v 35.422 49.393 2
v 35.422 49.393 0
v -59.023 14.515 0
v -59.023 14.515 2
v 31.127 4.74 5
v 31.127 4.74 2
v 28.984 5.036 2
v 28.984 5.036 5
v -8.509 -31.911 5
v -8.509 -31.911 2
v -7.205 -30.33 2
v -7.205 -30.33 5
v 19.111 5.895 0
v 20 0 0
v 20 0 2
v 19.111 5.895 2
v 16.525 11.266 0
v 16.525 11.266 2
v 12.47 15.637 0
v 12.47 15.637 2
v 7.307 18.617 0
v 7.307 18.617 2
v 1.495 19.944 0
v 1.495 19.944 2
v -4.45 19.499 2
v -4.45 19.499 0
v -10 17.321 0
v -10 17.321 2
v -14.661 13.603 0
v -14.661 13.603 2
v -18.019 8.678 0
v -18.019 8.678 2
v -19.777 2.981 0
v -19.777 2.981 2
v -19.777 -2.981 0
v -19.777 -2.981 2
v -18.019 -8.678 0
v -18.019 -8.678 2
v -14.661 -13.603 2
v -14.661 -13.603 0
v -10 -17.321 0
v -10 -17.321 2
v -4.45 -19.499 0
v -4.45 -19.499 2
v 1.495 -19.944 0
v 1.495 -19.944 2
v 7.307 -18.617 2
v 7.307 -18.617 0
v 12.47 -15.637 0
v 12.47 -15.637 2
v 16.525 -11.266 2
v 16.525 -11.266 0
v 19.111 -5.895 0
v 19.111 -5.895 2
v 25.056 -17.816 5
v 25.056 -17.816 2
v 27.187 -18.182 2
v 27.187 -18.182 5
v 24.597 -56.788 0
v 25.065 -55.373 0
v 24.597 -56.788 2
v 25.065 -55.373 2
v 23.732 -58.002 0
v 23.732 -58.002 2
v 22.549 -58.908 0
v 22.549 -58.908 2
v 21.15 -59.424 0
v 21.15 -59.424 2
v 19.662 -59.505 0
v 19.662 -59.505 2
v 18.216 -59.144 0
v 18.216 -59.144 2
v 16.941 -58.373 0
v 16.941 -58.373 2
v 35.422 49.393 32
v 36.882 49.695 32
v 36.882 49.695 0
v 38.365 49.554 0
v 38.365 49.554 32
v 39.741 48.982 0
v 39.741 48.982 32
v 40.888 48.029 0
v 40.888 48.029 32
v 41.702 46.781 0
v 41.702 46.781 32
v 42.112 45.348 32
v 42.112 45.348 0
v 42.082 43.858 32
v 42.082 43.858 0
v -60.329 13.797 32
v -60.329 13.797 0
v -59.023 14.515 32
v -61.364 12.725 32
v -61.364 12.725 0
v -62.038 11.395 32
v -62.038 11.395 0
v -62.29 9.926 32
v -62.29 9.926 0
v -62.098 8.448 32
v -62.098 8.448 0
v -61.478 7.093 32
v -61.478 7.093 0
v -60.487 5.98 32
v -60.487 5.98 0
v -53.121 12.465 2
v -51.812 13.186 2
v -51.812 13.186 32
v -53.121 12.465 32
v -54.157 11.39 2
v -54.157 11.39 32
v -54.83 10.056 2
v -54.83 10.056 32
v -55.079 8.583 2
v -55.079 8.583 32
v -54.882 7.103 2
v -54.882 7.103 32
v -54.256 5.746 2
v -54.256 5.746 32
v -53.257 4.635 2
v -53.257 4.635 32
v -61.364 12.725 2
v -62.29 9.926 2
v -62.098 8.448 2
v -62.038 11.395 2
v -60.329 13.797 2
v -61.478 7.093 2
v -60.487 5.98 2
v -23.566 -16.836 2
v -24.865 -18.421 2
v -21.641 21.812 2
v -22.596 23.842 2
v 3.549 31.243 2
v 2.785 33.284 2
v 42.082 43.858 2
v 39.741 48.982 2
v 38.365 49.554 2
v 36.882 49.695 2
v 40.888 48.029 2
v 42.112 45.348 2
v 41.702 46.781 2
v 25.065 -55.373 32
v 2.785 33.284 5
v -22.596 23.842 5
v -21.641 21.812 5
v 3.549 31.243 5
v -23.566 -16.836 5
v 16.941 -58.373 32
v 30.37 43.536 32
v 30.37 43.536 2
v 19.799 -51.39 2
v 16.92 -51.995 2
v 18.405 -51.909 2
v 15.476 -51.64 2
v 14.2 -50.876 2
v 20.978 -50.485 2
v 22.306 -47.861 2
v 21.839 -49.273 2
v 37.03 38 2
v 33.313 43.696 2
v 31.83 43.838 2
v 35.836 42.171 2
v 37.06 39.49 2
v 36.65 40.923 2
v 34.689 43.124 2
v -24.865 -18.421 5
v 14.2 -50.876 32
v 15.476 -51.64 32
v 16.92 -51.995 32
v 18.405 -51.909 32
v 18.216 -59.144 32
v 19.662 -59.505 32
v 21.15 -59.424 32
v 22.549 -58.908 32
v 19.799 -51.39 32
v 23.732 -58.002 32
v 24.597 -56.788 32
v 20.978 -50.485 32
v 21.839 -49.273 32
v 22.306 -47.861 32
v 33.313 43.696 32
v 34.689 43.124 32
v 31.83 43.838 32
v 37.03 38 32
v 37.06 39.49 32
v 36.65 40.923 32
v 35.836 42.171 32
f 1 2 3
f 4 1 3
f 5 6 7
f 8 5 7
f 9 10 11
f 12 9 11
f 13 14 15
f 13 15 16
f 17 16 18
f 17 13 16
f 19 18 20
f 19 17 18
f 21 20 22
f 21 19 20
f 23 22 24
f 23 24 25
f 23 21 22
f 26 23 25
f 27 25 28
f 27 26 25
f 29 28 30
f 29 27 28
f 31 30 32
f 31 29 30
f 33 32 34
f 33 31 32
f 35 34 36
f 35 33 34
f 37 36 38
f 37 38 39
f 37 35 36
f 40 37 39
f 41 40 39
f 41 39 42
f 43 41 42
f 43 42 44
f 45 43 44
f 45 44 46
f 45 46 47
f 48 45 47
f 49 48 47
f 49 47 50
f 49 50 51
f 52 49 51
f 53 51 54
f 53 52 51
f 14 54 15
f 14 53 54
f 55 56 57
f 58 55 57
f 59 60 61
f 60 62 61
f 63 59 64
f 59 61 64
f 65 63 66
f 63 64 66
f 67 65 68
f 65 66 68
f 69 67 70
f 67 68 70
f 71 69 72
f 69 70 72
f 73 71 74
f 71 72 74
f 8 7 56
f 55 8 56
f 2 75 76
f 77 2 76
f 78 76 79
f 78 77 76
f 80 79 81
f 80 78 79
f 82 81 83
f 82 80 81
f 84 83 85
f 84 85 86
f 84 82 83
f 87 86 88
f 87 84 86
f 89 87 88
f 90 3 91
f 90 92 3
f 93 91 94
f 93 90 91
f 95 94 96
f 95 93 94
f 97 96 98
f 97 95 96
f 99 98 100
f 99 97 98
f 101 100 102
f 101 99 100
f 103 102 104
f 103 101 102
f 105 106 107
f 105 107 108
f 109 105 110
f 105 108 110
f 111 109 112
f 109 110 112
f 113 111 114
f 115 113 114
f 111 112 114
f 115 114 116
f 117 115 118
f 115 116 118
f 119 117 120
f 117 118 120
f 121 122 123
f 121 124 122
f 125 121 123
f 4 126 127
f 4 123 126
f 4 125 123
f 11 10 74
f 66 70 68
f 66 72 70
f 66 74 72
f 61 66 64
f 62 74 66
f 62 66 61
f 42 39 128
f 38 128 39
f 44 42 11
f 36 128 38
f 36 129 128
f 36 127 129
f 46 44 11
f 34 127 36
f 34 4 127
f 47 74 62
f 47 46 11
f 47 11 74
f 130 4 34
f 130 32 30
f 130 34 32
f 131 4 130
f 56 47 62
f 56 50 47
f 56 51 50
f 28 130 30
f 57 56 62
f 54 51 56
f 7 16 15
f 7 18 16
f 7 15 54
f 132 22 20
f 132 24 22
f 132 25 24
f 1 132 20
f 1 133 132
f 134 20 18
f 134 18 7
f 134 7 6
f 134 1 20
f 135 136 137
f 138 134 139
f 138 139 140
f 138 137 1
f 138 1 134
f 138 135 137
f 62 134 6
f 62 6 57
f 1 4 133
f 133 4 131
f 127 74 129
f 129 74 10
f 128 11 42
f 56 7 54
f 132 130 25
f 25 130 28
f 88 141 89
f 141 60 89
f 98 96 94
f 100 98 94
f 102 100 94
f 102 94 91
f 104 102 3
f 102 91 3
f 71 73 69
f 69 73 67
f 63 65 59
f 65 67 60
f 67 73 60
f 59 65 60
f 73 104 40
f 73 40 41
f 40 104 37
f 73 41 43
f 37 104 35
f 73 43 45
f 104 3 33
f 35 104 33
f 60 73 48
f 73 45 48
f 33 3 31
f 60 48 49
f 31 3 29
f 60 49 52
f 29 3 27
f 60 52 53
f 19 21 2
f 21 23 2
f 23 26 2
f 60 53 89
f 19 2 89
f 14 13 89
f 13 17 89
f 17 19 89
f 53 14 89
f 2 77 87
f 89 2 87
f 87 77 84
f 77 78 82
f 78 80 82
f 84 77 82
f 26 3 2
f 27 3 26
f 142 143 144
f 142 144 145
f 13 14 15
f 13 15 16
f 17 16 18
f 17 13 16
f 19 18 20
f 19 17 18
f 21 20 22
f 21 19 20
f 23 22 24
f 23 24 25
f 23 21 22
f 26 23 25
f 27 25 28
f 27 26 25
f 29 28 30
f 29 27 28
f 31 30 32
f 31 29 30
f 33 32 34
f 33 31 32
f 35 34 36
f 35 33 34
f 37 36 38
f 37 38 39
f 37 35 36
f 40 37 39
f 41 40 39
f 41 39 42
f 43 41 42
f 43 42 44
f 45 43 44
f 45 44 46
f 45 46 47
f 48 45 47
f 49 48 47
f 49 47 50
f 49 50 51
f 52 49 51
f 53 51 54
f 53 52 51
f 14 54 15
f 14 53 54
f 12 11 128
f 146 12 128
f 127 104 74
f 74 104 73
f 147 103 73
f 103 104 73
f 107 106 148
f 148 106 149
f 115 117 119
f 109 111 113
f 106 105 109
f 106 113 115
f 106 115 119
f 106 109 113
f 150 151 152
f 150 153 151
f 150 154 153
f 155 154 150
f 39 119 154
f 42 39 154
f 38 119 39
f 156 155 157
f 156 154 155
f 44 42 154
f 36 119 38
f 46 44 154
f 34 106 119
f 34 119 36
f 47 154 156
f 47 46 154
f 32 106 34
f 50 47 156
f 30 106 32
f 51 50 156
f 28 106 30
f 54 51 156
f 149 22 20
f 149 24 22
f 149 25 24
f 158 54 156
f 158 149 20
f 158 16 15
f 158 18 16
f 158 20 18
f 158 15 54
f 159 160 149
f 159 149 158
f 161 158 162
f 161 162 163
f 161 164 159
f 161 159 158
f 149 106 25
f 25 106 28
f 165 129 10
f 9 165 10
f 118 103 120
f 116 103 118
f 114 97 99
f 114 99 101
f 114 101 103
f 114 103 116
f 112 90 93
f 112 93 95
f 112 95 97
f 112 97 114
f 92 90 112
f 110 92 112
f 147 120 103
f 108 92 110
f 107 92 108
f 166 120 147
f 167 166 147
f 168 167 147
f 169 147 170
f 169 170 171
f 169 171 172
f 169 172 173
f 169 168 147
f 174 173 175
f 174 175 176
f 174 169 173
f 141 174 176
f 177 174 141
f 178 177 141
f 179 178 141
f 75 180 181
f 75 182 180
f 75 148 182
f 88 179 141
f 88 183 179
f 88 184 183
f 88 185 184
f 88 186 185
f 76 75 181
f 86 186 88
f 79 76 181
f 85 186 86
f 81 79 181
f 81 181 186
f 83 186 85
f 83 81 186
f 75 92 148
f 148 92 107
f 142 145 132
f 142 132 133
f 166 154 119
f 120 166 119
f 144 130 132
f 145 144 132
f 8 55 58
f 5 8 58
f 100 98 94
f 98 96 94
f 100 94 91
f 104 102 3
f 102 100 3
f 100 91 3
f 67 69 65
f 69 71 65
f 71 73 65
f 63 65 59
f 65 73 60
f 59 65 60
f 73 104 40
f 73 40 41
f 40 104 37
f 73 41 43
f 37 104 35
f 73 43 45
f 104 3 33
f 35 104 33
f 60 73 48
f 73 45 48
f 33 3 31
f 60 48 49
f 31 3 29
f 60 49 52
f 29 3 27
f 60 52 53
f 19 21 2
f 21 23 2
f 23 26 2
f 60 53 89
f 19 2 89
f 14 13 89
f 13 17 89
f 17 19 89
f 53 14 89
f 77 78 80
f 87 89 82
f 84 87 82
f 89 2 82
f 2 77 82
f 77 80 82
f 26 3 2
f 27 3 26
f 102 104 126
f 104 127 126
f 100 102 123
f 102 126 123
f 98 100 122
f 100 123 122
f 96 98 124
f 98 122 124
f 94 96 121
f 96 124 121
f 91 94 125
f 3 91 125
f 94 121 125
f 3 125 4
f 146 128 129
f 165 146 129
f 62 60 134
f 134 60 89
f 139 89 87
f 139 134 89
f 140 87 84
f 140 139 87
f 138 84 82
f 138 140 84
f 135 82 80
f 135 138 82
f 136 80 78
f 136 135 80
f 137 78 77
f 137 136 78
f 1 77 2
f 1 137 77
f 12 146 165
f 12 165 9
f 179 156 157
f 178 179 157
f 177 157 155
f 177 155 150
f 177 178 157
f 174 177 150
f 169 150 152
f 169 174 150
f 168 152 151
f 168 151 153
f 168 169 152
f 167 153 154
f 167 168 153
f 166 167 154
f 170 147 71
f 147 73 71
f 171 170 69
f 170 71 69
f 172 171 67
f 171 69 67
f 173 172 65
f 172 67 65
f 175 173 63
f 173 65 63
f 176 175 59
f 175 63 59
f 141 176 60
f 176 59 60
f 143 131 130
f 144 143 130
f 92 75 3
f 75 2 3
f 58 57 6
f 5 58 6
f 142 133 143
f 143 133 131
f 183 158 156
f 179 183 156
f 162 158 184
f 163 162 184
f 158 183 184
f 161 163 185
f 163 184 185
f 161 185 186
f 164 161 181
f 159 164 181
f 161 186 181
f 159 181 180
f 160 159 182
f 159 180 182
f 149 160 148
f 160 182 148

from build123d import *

# Parameters (mm, degrees)
F0_R     = 20
F1_DEPTH = 2
F3_DEPTH = 30
F4_R     = 5
F5_R     = 5
F6_DEPTH = 2
F7_R     = 5
F9_DEPTH = 3


with BuildPart() as f1:
    # F0 (on Top) → F1 (new body)
    with BuildSketch(Plane.XY):
        Polygon((23.6009889939, -63.9087368976), (43.5460951802, 52.3934244719), (-67.147084174, 11.5153124257), align=None)
        Circle(F0_R, mode=Mode.SUBTRACT)
    extrude(amount=F1_DEPTH)

    # F2 (on face) → F3 (join)
    with BuildSketch(Plane.XY.offset(2)):
        Polygon((43.5460951802, 52.3934244719), (-67.147084174, 11.5153124257), (23.6009889939, -63.9087368976), align=None)
        Polygon((20.8500493318, -56.3483797014), (-59.9821954966, 10.1693784818), (38.4940678967, 46.5358804865), align=None, mode=Mode.SUBTRACT)
    extrude(amount=F3_DEPTH)

    # F4
    f4_edges = [f1.edges().sort_by_distance(p)[0] for p in [
        (-67.147084, 11.515312, 16),
        (43.546095, 52.393424, 16),
        (23.600989, -63.908737, 16),
    ]]
    fillet(f4_edges, radius=F4_R)

    # F5
    f5_edges = [f1.edges().sort_by_distance(p)[0] for p in [
        (-59.982195, 10.169378, 17),
        (38.494068, 46.53588, 17),
        (20.850049, -56.34838, 17),
    ]]
    fillet(f5_edges, radius=F5_R)


with BuildPart() as f6:
    # F0 (on Top) → F6 (new body)
    with BuildSketch(Plane.XY):
        Polygon((23.6009889939, -63.9087368976), (43.5460951802, 52.3934244719), (-67.147084174, 11.5153124257), align=None)
        Circle(F0_R, mode=Mode.SUBTRACT)
    extrude(amount=F6_DEPTH)

    # F7
    f7_edges = [f6.edges().sort_by_distance(p)[0] for p in [
        (-67.147084, 11.515312, 1),
        (23.600989, -63.908737, 1),
        (43.546095, 52.393424, 1),
    ]]
    fillet(f7_edges, radius=F7_R)

    # F8 (on face) → F9 (join)
    with BuildSketch(Plane.XY.offset(2)):
        Polygon((-23.5661102989, -16.8355783103), (-24.8647145927, -18.4205565602), (-8.5090165958, -31.9110229611), (-7.2052266655, -30.3303219151), align=None)
        Polygon((2.7846527248, 33.2844954095), (-22.5964058191, 23.8416101784), (-21.6413289309, 21.8120720237), (3.5488323774, 31.2434583902), align=None)
        Polygon((27.1869953722, -18.1817878038), (31.1266854405, 4.740065895), (28.9837907485, 5.0356259463), (25.0562457372, -17.815565539), align=None)
    extrude(amount=F9_DEPTH)


solid = Compound([f1.part, f6.part])
